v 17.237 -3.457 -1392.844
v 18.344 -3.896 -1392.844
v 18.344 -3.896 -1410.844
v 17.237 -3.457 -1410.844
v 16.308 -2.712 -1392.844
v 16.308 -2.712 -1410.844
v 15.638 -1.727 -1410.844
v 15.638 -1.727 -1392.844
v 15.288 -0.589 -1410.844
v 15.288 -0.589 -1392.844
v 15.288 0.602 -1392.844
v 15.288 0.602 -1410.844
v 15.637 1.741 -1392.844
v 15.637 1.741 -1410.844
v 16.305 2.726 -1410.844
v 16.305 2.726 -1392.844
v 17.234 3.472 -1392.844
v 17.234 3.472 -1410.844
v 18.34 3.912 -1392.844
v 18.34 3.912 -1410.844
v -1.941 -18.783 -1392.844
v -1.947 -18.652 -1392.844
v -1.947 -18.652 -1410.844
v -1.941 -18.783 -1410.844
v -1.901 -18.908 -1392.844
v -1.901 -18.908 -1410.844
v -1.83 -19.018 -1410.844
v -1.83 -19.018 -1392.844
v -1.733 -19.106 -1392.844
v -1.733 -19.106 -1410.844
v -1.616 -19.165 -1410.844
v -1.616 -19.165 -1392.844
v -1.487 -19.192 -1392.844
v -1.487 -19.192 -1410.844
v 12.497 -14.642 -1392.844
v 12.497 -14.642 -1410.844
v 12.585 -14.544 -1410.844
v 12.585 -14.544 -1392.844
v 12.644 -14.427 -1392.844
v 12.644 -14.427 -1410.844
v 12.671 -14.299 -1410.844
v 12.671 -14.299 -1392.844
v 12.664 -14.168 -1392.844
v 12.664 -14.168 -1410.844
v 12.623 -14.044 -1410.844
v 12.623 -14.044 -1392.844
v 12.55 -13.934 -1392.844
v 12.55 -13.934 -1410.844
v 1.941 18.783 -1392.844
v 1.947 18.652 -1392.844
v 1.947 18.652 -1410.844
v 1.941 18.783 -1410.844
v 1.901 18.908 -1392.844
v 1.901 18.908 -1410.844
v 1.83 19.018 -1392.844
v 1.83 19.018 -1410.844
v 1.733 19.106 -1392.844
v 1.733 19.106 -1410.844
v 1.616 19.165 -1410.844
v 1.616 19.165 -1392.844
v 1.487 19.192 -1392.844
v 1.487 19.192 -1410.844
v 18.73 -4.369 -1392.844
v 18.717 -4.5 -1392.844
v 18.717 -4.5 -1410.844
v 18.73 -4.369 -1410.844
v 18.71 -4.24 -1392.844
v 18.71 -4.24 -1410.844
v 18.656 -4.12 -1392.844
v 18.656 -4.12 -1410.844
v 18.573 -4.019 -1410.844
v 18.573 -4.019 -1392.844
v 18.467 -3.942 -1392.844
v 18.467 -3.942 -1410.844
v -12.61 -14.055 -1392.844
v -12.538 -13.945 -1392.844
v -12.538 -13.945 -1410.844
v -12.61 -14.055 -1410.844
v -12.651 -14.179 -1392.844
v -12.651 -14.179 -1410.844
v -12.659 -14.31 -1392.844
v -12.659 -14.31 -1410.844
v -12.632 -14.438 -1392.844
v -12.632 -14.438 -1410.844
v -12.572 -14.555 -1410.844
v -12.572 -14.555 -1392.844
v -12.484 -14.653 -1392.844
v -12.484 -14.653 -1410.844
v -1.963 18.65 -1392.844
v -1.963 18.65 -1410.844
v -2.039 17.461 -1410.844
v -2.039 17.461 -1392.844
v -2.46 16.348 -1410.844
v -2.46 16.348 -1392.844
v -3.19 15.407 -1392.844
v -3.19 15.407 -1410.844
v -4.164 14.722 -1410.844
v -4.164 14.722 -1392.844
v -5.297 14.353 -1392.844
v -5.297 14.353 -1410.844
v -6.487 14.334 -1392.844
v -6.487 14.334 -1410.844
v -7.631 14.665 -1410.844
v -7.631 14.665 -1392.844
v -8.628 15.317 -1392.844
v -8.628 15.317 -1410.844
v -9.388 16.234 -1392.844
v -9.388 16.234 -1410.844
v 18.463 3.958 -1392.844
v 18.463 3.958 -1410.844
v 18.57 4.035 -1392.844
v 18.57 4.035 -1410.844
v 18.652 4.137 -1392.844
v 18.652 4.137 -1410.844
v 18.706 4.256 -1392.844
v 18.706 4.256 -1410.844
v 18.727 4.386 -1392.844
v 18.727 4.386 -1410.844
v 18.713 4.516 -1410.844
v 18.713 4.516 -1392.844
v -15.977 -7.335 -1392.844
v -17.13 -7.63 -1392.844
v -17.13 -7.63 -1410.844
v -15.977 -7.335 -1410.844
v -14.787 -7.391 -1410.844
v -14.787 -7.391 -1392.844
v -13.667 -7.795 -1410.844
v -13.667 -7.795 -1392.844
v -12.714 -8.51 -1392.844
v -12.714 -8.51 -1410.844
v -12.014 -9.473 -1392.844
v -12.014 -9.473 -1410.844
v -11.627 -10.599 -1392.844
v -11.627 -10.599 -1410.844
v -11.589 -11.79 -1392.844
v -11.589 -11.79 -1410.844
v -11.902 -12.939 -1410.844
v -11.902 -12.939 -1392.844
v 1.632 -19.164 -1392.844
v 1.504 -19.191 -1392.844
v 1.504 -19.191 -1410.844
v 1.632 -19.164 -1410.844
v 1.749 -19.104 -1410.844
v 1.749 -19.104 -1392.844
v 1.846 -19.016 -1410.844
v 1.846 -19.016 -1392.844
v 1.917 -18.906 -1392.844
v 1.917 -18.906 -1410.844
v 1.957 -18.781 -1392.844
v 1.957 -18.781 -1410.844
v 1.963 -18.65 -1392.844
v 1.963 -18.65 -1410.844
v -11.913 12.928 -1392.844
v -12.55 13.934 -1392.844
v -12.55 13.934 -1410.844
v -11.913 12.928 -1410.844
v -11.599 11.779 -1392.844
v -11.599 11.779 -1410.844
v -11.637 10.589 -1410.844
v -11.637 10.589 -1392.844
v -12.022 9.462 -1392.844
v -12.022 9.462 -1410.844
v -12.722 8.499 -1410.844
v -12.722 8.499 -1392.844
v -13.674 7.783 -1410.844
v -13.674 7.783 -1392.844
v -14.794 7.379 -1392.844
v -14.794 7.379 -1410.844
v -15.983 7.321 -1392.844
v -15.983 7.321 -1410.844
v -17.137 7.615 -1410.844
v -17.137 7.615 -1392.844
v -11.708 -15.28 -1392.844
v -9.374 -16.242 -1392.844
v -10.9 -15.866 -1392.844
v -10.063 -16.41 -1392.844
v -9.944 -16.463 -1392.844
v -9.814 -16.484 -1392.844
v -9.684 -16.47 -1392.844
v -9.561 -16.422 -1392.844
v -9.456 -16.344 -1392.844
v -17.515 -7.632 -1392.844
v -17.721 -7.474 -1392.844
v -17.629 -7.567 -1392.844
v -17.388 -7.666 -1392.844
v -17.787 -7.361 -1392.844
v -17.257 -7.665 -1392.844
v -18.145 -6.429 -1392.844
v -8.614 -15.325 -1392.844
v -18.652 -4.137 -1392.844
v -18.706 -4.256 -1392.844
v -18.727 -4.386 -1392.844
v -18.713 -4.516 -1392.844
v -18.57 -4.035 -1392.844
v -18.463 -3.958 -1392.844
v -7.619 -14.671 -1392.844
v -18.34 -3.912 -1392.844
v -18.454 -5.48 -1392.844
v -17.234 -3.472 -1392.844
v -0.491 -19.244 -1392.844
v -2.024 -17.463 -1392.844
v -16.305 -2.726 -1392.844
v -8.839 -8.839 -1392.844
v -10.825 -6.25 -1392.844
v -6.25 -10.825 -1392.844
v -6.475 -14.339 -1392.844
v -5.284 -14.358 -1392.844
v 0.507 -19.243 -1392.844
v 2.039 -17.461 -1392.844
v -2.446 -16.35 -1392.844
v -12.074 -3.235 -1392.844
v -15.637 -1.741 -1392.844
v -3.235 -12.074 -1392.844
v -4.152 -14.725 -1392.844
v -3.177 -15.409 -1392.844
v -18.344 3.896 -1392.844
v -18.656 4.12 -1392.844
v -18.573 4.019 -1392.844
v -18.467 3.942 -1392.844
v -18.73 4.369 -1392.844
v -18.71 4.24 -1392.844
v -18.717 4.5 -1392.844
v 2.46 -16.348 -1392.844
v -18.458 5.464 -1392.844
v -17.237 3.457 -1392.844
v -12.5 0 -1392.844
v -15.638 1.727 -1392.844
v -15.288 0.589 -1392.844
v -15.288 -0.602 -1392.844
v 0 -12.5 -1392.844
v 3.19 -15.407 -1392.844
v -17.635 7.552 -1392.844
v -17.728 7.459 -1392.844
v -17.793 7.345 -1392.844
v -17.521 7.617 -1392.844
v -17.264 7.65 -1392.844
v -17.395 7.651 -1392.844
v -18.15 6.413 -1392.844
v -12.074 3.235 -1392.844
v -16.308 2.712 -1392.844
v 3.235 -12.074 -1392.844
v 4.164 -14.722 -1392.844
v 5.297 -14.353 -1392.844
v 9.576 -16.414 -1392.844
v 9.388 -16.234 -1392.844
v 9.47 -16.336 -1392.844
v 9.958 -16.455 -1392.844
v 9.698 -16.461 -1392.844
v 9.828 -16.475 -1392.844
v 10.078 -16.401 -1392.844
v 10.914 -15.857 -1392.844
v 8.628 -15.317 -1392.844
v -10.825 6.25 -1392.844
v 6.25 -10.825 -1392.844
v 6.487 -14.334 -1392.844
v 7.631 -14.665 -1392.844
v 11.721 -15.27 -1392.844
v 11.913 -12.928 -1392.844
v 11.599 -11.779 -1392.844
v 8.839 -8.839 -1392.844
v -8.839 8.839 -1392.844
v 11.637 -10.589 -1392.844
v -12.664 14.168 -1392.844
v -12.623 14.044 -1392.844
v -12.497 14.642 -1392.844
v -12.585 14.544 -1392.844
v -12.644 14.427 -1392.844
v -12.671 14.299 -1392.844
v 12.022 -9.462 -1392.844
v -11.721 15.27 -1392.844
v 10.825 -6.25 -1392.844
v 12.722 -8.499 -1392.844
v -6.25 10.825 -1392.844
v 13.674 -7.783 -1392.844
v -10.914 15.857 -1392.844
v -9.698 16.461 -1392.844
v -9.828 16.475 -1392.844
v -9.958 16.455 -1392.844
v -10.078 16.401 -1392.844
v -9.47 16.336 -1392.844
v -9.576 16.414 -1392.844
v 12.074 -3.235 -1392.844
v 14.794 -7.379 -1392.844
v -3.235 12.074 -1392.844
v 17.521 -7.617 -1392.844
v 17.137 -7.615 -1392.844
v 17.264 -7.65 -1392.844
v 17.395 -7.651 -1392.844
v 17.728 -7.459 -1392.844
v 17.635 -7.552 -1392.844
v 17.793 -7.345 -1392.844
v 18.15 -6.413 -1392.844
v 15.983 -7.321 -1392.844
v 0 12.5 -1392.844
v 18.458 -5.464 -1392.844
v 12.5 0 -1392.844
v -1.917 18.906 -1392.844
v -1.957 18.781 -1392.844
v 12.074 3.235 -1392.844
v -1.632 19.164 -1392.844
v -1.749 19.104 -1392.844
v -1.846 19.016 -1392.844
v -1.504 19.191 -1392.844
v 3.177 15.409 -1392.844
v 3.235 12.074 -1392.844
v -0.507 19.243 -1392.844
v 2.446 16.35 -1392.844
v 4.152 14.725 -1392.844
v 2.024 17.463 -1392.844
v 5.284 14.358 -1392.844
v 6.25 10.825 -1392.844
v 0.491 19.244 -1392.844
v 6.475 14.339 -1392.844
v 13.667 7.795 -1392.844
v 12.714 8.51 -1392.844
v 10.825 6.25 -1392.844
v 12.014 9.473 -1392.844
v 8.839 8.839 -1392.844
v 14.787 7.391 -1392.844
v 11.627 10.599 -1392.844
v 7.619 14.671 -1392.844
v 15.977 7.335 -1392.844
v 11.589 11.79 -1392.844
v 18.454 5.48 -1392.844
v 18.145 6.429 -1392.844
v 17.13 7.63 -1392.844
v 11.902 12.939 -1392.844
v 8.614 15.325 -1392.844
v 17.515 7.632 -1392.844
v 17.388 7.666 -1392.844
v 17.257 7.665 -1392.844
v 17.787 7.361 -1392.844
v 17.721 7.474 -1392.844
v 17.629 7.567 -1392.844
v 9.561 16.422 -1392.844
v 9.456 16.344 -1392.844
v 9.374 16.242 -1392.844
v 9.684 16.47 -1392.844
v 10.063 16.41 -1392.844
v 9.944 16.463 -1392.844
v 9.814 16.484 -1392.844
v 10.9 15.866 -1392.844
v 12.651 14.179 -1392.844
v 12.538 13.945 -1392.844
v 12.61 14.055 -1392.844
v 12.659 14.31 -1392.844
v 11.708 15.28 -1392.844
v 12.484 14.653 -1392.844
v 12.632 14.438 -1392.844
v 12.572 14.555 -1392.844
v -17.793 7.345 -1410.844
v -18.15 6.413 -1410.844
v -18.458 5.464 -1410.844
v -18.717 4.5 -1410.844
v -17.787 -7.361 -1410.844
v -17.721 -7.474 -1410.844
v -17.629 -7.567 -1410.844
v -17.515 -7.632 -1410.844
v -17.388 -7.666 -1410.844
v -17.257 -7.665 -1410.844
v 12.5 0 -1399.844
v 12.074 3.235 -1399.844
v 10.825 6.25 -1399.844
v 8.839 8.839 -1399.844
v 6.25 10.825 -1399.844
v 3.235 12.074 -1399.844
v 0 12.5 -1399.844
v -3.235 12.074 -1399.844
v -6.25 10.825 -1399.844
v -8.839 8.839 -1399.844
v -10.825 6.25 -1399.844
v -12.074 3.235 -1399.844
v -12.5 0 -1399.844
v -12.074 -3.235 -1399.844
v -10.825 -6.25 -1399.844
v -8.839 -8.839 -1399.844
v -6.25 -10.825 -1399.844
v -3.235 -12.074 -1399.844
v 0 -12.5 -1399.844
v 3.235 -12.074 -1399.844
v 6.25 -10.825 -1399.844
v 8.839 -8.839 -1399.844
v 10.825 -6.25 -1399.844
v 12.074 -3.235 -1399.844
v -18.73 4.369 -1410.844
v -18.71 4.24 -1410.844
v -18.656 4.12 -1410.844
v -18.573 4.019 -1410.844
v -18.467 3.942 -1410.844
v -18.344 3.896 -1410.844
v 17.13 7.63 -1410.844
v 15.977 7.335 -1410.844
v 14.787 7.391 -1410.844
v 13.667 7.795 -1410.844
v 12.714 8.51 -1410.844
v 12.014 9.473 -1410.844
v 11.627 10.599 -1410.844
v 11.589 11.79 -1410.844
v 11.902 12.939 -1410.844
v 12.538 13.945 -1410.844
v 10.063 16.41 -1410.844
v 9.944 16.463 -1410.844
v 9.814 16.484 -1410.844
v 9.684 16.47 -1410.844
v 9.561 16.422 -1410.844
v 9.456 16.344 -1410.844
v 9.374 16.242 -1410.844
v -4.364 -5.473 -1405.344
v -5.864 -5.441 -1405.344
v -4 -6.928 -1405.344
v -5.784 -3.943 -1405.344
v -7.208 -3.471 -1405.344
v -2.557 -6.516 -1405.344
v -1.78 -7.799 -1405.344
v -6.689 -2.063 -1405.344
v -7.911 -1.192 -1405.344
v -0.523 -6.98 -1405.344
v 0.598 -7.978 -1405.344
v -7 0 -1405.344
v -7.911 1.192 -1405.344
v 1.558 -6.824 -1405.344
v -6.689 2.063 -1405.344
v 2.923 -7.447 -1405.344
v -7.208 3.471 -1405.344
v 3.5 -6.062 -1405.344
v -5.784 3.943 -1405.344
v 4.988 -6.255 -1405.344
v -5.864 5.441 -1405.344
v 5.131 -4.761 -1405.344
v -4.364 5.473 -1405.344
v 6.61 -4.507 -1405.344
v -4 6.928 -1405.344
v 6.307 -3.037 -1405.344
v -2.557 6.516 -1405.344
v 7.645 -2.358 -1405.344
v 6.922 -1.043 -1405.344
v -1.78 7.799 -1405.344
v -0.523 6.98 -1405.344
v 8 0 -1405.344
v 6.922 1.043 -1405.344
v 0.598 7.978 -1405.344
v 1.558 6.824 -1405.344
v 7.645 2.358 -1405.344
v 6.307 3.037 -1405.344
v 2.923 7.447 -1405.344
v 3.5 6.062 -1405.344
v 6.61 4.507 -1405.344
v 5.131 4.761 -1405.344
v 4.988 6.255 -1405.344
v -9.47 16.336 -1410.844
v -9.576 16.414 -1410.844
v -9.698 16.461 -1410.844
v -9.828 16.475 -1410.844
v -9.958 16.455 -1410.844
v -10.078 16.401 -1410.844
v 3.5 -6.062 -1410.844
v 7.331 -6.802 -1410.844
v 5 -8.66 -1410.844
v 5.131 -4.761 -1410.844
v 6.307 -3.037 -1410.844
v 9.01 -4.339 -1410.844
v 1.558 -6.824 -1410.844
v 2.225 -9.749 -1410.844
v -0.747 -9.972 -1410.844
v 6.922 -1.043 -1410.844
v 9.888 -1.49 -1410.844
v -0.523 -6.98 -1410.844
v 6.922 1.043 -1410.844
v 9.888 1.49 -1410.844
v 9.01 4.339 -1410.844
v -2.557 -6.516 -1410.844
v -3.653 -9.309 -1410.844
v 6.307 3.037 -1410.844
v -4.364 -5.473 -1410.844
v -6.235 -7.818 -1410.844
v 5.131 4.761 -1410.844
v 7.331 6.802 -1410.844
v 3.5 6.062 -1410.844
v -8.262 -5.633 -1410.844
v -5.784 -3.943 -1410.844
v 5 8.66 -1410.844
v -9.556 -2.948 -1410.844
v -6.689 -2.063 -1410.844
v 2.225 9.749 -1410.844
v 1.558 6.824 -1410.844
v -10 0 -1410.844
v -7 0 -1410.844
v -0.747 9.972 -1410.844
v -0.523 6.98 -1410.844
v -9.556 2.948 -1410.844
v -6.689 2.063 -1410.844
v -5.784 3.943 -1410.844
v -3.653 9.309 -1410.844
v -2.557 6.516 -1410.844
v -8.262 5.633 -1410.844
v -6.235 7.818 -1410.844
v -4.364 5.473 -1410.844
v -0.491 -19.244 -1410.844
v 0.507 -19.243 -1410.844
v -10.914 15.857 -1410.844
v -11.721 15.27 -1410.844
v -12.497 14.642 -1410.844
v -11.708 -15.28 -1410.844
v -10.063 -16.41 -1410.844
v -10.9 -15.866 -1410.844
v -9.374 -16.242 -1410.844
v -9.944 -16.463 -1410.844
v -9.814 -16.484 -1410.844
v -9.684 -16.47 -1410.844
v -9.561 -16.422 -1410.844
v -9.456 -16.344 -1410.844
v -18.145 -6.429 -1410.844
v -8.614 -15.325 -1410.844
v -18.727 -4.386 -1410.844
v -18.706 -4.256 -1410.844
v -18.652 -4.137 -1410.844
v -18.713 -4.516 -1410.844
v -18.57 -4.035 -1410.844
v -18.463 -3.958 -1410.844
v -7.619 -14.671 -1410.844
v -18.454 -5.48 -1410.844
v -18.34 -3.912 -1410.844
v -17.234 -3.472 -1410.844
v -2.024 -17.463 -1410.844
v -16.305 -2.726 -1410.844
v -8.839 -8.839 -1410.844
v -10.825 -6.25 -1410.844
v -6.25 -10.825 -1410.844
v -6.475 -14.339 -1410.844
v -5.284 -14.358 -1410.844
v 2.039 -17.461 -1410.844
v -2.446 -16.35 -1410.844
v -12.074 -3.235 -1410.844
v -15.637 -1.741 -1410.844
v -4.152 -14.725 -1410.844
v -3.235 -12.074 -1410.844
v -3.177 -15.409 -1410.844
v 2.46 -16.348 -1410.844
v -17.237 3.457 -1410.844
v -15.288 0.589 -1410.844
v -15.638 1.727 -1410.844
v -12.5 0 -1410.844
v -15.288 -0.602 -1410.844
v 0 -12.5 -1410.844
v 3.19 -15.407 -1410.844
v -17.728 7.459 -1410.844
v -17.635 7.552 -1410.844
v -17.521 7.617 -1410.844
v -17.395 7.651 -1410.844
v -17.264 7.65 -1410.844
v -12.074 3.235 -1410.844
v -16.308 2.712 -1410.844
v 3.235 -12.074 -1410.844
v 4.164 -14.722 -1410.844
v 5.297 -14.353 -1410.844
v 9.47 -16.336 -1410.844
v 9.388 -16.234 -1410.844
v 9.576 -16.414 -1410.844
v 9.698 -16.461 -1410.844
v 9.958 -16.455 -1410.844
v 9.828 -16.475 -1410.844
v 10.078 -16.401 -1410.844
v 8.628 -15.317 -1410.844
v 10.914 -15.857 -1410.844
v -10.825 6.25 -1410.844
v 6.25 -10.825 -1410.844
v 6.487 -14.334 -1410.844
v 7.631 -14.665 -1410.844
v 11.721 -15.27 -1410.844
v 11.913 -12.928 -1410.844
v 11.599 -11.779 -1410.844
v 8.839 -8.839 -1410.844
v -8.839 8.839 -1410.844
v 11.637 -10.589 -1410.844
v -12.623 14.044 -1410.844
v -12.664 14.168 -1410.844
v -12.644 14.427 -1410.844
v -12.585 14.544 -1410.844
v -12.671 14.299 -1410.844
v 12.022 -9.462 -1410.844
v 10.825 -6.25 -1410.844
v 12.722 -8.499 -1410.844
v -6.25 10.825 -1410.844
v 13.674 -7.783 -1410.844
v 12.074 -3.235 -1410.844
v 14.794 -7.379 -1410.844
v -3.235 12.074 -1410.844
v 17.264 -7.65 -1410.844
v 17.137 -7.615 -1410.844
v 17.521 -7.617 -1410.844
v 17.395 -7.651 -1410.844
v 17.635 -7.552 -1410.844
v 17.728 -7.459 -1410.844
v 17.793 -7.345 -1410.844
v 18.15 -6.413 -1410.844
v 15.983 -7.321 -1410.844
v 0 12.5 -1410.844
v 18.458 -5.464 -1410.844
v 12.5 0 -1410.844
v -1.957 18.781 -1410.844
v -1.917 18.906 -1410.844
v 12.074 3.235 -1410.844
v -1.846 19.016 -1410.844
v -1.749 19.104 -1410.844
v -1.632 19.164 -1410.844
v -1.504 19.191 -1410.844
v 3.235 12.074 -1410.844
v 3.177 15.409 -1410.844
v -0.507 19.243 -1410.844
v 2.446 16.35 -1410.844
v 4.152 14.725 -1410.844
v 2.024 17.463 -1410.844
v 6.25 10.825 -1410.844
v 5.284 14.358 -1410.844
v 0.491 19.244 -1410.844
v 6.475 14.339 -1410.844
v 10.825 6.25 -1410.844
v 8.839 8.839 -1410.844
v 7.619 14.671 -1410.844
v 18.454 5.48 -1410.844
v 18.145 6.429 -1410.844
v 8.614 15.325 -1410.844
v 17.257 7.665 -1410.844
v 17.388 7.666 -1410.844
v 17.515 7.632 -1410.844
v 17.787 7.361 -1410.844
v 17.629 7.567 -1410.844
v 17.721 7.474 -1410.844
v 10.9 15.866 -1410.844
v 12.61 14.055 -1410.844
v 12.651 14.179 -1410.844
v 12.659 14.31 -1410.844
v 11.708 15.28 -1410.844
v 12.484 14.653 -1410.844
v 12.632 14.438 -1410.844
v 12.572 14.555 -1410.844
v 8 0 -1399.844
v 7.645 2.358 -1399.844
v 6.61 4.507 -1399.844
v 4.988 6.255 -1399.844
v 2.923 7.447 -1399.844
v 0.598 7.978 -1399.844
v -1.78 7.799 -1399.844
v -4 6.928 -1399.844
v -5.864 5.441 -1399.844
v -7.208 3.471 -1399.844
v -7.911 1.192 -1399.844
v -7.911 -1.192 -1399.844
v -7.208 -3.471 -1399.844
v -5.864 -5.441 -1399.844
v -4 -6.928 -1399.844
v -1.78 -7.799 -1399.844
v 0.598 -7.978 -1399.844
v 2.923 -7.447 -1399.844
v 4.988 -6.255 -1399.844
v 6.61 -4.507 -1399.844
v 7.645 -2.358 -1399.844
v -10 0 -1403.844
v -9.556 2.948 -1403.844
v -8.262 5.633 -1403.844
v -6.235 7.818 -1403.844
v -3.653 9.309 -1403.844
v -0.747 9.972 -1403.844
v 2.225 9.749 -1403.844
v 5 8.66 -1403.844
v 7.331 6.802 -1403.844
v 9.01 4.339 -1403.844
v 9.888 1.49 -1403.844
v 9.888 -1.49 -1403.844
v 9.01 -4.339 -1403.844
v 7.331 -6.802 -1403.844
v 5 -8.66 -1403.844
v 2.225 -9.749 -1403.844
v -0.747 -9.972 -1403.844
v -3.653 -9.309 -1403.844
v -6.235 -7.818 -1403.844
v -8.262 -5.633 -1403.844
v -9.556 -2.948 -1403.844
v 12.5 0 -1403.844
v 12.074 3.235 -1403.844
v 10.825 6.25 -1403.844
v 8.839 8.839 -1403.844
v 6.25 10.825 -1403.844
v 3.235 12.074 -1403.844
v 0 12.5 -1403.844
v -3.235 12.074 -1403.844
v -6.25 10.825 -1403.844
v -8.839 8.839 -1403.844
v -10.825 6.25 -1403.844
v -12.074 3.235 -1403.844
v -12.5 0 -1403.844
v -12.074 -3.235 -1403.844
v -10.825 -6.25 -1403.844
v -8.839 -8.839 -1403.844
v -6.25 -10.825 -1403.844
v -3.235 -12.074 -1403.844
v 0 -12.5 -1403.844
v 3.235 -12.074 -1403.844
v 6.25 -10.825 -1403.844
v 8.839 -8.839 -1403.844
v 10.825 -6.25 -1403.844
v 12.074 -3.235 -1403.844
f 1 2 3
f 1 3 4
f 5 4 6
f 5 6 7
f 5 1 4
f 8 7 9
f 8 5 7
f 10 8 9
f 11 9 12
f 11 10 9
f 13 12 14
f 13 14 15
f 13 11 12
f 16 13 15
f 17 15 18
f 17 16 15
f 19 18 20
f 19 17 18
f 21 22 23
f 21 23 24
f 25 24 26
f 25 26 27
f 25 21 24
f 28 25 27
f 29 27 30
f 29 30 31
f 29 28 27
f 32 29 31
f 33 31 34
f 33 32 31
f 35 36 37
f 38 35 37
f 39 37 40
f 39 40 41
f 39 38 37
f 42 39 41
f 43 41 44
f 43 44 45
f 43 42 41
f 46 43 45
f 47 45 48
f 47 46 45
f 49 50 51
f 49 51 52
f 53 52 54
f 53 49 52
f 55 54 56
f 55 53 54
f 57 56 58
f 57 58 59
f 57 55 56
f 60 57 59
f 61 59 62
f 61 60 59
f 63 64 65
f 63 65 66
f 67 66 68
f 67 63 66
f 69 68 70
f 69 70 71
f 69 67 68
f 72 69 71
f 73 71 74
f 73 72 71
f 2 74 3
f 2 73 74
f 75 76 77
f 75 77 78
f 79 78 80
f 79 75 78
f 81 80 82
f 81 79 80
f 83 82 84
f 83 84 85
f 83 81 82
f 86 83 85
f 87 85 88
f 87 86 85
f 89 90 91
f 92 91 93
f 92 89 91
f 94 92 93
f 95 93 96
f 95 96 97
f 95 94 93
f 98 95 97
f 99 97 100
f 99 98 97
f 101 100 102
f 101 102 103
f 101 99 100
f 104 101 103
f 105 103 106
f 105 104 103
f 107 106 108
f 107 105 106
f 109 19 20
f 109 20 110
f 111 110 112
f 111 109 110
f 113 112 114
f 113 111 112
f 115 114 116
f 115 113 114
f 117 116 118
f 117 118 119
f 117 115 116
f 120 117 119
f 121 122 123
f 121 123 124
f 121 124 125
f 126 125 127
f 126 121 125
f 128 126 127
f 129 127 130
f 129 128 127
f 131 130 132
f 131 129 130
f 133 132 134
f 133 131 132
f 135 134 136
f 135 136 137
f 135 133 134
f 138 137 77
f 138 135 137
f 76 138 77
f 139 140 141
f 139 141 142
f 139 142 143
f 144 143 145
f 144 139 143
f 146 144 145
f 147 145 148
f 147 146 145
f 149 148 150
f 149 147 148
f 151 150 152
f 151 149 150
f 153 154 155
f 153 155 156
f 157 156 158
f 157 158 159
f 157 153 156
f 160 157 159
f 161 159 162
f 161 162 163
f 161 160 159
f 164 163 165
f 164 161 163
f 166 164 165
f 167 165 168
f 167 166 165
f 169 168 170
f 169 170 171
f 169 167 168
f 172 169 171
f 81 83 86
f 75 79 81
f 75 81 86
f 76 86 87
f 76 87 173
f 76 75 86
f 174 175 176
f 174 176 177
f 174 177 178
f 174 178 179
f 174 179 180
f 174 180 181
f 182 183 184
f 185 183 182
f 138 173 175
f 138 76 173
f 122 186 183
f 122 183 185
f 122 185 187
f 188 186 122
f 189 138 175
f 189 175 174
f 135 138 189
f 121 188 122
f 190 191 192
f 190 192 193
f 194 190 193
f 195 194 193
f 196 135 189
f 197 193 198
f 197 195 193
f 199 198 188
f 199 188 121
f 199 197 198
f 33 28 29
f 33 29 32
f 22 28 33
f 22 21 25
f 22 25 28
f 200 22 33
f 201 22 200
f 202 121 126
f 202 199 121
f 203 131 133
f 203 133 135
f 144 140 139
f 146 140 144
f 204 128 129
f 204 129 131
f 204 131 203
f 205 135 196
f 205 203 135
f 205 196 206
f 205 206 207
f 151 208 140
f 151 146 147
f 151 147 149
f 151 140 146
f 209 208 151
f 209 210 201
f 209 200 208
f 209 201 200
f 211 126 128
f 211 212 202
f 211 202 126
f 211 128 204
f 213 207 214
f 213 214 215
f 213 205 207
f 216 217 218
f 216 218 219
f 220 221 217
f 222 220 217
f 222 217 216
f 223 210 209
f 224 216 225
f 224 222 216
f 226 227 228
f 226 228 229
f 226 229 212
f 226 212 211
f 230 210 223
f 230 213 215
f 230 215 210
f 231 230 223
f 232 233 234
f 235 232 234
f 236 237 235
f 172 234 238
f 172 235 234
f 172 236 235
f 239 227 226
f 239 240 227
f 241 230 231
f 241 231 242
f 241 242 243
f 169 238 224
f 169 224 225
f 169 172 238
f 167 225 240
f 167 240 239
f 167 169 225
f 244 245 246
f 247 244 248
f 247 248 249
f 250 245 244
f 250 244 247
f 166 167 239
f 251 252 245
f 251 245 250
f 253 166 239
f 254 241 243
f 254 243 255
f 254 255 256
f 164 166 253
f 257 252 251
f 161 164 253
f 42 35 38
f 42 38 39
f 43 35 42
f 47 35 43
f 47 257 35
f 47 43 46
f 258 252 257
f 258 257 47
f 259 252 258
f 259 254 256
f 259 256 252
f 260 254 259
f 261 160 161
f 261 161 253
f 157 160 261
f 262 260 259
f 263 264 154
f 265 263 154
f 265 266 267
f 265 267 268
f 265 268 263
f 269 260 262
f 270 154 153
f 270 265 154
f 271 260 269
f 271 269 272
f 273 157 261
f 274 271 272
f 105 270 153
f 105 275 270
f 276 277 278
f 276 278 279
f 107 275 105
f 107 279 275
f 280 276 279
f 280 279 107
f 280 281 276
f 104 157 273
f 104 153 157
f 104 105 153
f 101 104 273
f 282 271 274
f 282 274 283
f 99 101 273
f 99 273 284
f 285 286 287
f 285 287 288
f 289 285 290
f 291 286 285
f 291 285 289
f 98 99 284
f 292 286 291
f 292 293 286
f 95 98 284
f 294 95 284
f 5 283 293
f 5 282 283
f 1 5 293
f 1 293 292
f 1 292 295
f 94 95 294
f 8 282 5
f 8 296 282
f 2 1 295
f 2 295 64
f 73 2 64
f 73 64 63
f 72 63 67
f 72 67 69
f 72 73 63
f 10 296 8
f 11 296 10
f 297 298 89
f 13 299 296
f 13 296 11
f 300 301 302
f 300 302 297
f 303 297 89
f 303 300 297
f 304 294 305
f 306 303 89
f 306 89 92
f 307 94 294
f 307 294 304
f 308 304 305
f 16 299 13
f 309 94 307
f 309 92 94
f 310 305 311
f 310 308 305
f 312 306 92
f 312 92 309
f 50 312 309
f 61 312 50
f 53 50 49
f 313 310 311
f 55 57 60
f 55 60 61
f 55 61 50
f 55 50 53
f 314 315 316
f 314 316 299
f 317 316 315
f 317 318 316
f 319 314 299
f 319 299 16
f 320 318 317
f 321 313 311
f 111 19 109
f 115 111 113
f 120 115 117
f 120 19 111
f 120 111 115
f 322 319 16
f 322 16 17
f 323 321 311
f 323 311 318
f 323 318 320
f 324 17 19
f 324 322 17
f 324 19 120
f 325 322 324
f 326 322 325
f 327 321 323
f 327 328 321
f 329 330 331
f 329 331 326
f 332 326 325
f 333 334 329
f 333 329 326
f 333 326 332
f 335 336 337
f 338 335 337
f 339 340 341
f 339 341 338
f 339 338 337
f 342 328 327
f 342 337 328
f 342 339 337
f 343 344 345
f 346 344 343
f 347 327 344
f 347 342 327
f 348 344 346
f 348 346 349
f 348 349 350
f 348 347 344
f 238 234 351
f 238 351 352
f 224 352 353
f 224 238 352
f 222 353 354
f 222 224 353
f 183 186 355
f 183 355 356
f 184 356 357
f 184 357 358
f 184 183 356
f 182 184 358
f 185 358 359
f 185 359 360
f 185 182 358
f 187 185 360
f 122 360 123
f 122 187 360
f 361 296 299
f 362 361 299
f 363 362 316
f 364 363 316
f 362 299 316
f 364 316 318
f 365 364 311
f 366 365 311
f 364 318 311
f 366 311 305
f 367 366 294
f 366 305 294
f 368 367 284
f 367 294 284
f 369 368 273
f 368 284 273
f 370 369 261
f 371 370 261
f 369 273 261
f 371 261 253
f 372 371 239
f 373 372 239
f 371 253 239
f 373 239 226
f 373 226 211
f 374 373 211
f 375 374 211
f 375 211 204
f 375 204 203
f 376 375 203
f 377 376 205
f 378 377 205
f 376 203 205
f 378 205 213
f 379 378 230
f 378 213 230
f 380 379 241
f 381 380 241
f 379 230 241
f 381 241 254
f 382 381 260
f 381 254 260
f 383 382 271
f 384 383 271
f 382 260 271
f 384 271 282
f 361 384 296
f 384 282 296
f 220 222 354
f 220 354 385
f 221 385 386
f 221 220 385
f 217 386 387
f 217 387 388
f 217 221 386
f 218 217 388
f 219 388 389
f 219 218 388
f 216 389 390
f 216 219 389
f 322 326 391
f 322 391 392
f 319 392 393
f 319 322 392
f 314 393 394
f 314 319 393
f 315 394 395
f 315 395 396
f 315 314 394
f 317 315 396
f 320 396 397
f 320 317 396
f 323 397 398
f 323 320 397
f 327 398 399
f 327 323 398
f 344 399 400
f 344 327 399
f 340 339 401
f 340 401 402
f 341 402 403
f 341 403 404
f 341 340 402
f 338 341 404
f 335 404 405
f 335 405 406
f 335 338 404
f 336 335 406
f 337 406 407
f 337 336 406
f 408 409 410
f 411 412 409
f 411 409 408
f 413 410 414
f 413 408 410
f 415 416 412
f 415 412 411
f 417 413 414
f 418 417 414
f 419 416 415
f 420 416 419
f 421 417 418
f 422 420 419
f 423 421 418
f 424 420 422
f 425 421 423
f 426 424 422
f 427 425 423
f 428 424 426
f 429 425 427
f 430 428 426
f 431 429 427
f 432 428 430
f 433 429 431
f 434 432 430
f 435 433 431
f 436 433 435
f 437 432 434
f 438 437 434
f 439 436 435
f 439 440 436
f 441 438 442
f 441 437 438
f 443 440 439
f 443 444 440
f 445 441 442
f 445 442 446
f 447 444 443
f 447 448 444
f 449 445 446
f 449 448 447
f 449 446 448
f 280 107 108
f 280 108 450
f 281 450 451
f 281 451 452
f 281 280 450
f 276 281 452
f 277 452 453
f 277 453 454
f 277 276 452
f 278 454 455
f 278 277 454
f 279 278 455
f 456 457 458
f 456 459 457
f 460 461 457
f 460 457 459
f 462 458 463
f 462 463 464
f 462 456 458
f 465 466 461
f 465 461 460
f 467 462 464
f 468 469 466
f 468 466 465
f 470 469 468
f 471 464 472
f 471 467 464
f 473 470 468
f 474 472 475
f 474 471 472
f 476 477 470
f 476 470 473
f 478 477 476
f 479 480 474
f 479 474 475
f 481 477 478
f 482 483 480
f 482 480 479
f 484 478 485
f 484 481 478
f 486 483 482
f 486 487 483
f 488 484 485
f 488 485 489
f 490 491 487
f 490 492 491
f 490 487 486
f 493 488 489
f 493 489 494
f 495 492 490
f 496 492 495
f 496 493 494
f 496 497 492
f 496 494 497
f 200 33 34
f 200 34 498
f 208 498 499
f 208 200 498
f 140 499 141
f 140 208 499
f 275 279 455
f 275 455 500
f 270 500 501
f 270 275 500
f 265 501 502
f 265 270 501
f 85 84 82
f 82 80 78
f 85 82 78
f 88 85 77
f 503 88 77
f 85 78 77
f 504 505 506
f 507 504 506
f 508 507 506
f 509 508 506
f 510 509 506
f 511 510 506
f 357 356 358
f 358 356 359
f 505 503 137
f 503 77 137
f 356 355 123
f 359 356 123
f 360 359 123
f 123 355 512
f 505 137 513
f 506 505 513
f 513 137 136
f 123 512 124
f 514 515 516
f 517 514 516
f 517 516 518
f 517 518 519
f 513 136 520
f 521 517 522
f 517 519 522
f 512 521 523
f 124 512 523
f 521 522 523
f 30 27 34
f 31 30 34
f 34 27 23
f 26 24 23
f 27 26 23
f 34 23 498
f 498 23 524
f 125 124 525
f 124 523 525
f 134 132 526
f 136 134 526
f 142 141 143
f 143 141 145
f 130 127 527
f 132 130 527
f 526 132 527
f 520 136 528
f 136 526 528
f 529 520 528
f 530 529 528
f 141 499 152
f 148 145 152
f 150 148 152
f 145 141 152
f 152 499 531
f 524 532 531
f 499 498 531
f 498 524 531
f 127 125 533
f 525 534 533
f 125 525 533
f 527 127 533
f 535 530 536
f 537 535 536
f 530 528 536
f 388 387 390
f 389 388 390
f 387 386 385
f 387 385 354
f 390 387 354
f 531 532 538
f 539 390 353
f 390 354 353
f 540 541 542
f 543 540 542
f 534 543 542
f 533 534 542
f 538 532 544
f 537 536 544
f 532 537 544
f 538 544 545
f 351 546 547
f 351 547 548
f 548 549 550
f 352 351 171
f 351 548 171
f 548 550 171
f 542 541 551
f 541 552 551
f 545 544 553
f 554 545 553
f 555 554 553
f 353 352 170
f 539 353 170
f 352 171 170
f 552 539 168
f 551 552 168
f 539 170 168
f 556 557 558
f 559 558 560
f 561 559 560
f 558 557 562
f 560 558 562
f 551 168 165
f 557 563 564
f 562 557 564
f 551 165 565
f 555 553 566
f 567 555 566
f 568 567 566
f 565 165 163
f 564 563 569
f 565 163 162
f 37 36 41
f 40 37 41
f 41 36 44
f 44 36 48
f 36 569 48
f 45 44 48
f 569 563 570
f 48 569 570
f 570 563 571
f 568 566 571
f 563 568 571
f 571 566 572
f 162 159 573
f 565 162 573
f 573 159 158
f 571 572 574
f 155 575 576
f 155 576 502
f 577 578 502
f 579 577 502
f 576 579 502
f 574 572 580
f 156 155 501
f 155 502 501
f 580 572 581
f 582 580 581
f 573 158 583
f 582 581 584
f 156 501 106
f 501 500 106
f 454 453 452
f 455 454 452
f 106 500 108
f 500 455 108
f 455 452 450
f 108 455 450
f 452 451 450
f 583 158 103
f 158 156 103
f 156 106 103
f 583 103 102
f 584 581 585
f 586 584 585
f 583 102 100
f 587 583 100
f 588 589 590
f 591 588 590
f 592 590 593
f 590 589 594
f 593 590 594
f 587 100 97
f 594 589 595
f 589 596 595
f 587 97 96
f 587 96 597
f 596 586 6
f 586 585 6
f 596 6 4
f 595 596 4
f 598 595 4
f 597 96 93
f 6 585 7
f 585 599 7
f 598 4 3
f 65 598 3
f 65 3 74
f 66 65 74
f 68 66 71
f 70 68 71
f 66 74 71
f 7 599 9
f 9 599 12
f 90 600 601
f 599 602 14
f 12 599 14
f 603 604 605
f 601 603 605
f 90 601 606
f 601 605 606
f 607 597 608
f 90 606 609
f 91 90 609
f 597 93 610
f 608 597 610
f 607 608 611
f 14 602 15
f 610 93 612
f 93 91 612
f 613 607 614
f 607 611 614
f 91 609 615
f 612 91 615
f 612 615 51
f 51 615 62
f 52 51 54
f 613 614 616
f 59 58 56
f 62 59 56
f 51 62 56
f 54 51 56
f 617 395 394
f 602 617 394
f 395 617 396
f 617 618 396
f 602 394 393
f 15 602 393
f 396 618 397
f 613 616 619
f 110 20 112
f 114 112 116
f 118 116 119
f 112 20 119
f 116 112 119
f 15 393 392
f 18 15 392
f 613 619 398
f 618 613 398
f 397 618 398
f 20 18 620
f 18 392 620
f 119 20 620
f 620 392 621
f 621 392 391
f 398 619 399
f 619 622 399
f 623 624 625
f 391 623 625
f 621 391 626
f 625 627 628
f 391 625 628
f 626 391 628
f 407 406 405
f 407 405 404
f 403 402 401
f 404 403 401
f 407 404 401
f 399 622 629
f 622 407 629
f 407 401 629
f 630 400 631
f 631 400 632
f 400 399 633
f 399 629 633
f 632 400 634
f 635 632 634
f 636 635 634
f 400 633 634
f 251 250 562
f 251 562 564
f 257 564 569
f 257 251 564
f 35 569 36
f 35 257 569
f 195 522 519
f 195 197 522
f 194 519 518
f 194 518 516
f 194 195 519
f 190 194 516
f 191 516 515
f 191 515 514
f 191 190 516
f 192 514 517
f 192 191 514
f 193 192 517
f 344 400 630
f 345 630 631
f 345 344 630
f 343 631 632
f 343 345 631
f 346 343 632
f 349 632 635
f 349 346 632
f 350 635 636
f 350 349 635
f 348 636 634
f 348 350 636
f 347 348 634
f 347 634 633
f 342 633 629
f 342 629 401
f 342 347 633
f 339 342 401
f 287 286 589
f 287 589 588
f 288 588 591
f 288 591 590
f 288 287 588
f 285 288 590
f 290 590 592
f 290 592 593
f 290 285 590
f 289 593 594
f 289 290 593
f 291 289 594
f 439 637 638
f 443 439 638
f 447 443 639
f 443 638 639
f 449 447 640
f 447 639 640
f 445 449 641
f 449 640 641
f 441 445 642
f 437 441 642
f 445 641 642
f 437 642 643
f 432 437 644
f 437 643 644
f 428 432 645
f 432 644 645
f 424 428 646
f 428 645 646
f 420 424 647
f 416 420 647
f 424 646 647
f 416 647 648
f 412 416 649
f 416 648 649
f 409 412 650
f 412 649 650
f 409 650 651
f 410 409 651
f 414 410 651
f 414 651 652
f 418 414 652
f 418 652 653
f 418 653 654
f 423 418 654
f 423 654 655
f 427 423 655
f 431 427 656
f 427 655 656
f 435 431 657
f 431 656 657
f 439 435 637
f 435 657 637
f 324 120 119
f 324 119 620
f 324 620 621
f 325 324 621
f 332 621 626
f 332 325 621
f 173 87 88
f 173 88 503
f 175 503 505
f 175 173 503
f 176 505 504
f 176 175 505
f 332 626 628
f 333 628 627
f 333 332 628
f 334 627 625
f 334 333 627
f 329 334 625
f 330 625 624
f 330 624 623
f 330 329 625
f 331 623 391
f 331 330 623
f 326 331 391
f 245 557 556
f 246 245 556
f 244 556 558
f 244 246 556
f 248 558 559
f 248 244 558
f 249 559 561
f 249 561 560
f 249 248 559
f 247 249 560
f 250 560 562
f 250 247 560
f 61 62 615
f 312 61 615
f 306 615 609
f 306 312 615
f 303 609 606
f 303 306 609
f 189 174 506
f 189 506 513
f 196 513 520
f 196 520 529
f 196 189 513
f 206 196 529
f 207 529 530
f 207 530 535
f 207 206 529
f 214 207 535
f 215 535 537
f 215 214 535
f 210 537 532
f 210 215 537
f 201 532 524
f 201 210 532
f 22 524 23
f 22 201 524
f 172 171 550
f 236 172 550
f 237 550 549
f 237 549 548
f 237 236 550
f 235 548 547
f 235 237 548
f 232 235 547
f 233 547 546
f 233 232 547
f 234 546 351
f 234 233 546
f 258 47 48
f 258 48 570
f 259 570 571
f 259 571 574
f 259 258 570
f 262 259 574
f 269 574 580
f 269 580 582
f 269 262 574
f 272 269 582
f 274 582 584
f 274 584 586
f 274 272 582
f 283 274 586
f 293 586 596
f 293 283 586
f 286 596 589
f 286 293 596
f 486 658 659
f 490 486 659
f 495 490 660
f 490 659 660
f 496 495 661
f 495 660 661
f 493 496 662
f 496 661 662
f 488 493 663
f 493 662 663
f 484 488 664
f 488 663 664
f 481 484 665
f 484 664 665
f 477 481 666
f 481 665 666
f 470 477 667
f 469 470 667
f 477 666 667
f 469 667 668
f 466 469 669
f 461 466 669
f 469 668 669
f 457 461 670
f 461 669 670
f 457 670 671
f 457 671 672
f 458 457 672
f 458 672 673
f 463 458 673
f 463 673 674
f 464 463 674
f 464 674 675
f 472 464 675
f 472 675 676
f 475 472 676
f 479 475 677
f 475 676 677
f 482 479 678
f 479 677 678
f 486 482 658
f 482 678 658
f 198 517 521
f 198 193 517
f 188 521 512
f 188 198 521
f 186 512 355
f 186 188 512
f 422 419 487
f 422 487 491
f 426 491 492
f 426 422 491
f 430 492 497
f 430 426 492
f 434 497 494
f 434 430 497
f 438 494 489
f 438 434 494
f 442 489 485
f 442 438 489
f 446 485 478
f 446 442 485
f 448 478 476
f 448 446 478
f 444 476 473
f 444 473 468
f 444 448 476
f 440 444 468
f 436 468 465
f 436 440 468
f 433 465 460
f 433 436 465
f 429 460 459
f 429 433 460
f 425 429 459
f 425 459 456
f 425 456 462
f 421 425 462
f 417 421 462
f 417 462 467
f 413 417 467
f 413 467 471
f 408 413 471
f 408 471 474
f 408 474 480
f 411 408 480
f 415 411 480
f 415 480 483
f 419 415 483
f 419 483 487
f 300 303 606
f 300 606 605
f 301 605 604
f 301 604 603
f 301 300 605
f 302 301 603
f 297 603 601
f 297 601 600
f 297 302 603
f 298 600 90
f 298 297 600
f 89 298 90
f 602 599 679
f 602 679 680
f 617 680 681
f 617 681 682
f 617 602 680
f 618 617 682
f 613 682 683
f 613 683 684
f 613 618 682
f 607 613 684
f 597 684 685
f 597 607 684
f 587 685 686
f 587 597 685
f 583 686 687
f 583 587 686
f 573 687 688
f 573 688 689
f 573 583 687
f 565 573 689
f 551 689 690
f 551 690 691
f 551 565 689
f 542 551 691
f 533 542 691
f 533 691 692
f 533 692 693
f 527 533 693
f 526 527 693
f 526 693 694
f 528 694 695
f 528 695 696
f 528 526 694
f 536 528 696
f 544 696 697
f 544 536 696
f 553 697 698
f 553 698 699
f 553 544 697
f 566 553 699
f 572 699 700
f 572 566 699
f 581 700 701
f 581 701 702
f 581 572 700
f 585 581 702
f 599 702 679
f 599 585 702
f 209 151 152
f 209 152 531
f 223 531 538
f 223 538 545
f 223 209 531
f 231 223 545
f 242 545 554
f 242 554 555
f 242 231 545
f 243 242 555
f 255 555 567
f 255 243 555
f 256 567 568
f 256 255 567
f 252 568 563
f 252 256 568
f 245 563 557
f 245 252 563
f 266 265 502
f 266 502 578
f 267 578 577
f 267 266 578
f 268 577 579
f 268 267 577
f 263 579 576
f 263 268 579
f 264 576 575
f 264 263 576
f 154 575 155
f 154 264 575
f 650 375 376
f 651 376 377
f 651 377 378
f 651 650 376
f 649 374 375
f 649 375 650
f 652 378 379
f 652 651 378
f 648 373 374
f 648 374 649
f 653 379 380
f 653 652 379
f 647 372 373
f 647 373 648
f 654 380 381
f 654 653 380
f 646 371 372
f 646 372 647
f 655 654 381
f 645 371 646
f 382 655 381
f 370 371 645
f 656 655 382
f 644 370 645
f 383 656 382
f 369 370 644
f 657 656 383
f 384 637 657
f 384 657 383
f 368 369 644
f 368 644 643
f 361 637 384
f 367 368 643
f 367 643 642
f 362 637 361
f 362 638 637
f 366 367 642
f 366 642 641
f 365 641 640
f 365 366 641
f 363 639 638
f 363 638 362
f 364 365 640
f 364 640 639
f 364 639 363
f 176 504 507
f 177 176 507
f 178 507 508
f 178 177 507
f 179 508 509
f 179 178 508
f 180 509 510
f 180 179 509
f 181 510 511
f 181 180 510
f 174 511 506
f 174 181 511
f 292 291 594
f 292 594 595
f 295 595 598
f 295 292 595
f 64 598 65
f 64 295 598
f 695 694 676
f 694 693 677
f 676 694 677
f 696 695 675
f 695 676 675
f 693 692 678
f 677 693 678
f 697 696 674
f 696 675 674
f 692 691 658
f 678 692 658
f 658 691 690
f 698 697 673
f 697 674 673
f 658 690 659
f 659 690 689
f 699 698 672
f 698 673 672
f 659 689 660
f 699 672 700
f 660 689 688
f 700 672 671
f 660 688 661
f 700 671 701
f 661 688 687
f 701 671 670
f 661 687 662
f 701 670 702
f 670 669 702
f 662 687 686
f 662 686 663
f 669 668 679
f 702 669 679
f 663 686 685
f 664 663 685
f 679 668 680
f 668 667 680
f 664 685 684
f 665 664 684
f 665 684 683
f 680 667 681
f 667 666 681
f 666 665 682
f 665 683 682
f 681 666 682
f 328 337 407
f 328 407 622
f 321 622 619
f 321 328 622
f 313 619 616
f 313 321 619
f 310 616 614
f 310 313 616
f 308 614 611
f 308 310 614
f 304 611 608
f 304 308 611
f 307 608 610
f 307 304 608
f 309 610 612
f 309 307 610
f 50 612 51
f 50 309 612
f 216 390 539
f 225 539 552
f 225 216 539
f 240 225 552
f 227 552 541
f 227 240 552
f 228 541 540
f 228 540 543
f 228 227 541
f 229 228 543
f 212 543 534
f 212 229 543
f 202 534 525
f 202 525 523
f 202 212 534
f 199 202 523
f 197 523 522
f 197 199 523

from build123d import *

# Parameters (mm, degrees)
SPROKET_DEPTH       = 9
SKETCH3_R           = 12.5
CUT_EXTRUDE1_DEPTH  = 7
SKETCH4_R           = 10
SKETCH4_R_2         = 7
BOSS_EXTRUDE1_DEPTH = 7
SKETCH5_R           = 8
CUT_EXTRUDE2_DEPTH  = 5.5


with BuildPart() as part:
    # Sprocket → Sproket (new body)
    with BuildSketch(Plane(origin=(-521.333895642, -864.335014518, -1401.843992528), x_dir=(1, 0, 0), z_dir=(0, 0, 1))):
        with BuildLine():
            ThreePointArc((502.621153074, 859.818847383), (503.02864119, 858.378492088), (503.546815178, 856.974153932))
            ThreePointArc((503.546815178, 856.974153932), (503.819037022, 856.702761655), (504.203425444, 856.704771932))
            ThreePointArc((504.203425444, 856.704771932), (509.005673001, 855.369858884), (508.795597259, 850.389955006))
            ThreePointArc((508.795597259, 850.389955006), (508.675219652, 850.024896474), (508.849505331, 849.682284445))
            ThreePointArc((508.849505331, 849.682284445), (510.025789743, 848.756528039), (511.270450563, 847.924969632))
            ThreePointArc((511.270450563, 847.924969632), (511.650203039, 847.865416653), (511.959998194, 848.092980848))
            ThreePointArc((511.959998194, 848.092980848), (516.629740281, 849.835703798), (519.386899492, 845.683397507))
            ThreePointArc((519.386899492, 845.683397507), (519.504087984, 845.317302769), (519.846470359, 845.142566367))
            ThreePointArc((519.846470359, 845.142566367), (521.342250401, 845.085016331), (522.837979924, 845.143864722))
            ThreePointArc((522.837979924, 845.143864722), (523.180210493, 845.318898255), (523.297081161, 845.685094579))
            ThreePointArc((523.297081161, 845.685094579), (526.05063502, 849.839792593), (530.721888079, 848.101123761))
            ThreePointArc((530.721888079, 848.101123761), (531.031880649, 847.873828563), (531.411581288, 847.933711155))
            ThreePointArc((531.411581288, 847.933711155), (532.655519825, 848.766349647), (533.831000211, 849.693126751))
            ThreePointArc((533.831000211, 849.693126751), (534.004988429, 850.035889936), (533.884293987, 850.400843839))
            ThreePointArc((533.884293987, 850.400843839), (533.669895633, 855.380563489), (538.470982641, 856.719644514))
            ThreePointArc((538.470982641, 856.719644514), (538.855372663, 856.717967897), (539.127358829, 856.989596368))
            ThreePointArc((539.127358829, 856.989596368), (539.644313618, 858.394383784), (540.050551314, 859.835092247))
            ThreePointArc((540.050551314, 859.835092247), (539.989839594, 860.214661197), (539.677681217, 860.438972694))
            ThreePointArc((539.677681217, 860.438972694), (536.577223534, 864.341630328), (539.674292437, 868.246977772))
            ThreePointArc((539.674292437, 868.246977772), (539.986255988, 868.471560146), (540.046638209, 868.851181652))
            ThreePointArc((540.046638209, 868.851181652), (539.639150093, 870.291536947), (539.120976106, 871.695875104))
            ThreePointArc((539.120976106, 871.695875104), (538.848754261, 871.967267381), (538.464365839, 871.965257104))
            ThreePointArc((538.464365839, 871.965257104), (533.662118282, 873.300170152), (533.872194024, 878.280074029))
            ThreePointArc((533.872194024, 878.280074029), (533.992571631, 878.645132562), (533.818285952, 878.98774459))
            ThreePointArc((533.818285952, 878.98774459), (532.642001541, 879.913500997), (531.39734072, 880.745059403))
            ThreePointArc((531.39734072, 880.745059403), (531.017588244, 880.804612382), (530.70779309, 880.577048188))
            ThreePointArc((530.70779309, 880.577048188), (526.038051002, 878.834325238), (523.280891791, 882.986631528))
            ThreePointArc((523.280891791, 882.986631528), (523.163703299, 883.352726267), (522.821320924, 883.527462669))
            ThreePointArc((522.821320924, 883.527462669), (521.325540883, 883.585012705), (519.829811359, 883.526164313))
            ThreePointArc((519.829811359, 883.526164313), (519.48758079, 883.35113078), (519.370710122, 882.984934457))
            ThreePointArc((519.370710122, 882.984934457), (516.617156263, 878.830236442), (511.945903204, 880.568905275))
            ThreePointArc((511.945903204, 880.568905275), (511.635910634, 880.796200472), (511.256209995, 880.736317881))
            ThreePointArc((511.256209995, 880.736317881), (510.012271459, 879.903679389), (508.836791072, 878.976902284))
            ThreePointArc((508.836791072, 878.976902284), (508.662802855, 878.6341391), (508.783497297, 878.269185196))
            ThreePointArc((508.783497297, 878.269185196), (508.99789565, 873.289465546), (504.196808642, 871.950384521))
            ThreePointArc((504.196808642, 871.950384521), (503.81241862, 871.952061138), (503.540432454, 871.680432668))
            ThreePointArc((503.540432454, 871.680432668), (503.023477665, 870.275645251), (502.617239969, 868.834936788))
            ThreePointArc((502.617239969, 868.834936788), (502.677951689, 868.455367839), (502.990110067, 868.231056341))
            ThreePointArc((502.990110067, 868.231056341), (506.090567749, 864.328398708), (502.993498846, 860.423051264))
            ThreePointArc((502.993498846, 860.423051264), (502.681535295, 860.198468889), (502.621153074, 859.818847383))
        make_face()
    sproket = extrude(amount=SPROKET_DEPTH)

    # Sketch3 → Cut-Extrude1 (cut)
    with BuildSketch(Plane.XY.offset(-1392.843992528)):
        Circle(SKETCH3_R)
    cut_extrude1 = extrude(amount=-CUT_EXTRUDE1_DEPTH, mode=Mode.SUBTRACT)

    # Mirror1: Sproket, Cut-Extrude1 across plane
    add(sproket.mirror(Plane(origin=(9.113348653, 2.199432046, -1401.843992528), x_dir=(1, 0, 0), z_dir=(0, 0, 1))))
    add(cut_extrude1.mirror(Plane(origin=(9.113348653, 2.199432046, -1401.843992528), x_dir=(1, 0, 0), z_dir=(0, 0, 1))), mode=Mode.SUBTRACT)

    # Sketch4 → Boss-Extrude1 (add)
    with BuildSketch(Plane(origin=(0, 0, -1403.843992528), x_dir=(-1, 0, 0), z_dir=(0, 0, -1))):
        Circle(SKETCH4_R)
        Circle(SKETCH4_R_2, mode=Mode.SUBTRACT)
    extrude(amount=BOSS_EXTRUDE1_DEPTH)

    # Sketch5 → Cut-Extrude2 (cut)
    with BuildSketch(Plane.XY.offset(-1399.843992528)):
        Circle(SKETCH5_R)
    extrude(amount=-CUT_EXTRUDE2_DEPTH, mode=Mode.SUBTRACT)


solid = part.part
